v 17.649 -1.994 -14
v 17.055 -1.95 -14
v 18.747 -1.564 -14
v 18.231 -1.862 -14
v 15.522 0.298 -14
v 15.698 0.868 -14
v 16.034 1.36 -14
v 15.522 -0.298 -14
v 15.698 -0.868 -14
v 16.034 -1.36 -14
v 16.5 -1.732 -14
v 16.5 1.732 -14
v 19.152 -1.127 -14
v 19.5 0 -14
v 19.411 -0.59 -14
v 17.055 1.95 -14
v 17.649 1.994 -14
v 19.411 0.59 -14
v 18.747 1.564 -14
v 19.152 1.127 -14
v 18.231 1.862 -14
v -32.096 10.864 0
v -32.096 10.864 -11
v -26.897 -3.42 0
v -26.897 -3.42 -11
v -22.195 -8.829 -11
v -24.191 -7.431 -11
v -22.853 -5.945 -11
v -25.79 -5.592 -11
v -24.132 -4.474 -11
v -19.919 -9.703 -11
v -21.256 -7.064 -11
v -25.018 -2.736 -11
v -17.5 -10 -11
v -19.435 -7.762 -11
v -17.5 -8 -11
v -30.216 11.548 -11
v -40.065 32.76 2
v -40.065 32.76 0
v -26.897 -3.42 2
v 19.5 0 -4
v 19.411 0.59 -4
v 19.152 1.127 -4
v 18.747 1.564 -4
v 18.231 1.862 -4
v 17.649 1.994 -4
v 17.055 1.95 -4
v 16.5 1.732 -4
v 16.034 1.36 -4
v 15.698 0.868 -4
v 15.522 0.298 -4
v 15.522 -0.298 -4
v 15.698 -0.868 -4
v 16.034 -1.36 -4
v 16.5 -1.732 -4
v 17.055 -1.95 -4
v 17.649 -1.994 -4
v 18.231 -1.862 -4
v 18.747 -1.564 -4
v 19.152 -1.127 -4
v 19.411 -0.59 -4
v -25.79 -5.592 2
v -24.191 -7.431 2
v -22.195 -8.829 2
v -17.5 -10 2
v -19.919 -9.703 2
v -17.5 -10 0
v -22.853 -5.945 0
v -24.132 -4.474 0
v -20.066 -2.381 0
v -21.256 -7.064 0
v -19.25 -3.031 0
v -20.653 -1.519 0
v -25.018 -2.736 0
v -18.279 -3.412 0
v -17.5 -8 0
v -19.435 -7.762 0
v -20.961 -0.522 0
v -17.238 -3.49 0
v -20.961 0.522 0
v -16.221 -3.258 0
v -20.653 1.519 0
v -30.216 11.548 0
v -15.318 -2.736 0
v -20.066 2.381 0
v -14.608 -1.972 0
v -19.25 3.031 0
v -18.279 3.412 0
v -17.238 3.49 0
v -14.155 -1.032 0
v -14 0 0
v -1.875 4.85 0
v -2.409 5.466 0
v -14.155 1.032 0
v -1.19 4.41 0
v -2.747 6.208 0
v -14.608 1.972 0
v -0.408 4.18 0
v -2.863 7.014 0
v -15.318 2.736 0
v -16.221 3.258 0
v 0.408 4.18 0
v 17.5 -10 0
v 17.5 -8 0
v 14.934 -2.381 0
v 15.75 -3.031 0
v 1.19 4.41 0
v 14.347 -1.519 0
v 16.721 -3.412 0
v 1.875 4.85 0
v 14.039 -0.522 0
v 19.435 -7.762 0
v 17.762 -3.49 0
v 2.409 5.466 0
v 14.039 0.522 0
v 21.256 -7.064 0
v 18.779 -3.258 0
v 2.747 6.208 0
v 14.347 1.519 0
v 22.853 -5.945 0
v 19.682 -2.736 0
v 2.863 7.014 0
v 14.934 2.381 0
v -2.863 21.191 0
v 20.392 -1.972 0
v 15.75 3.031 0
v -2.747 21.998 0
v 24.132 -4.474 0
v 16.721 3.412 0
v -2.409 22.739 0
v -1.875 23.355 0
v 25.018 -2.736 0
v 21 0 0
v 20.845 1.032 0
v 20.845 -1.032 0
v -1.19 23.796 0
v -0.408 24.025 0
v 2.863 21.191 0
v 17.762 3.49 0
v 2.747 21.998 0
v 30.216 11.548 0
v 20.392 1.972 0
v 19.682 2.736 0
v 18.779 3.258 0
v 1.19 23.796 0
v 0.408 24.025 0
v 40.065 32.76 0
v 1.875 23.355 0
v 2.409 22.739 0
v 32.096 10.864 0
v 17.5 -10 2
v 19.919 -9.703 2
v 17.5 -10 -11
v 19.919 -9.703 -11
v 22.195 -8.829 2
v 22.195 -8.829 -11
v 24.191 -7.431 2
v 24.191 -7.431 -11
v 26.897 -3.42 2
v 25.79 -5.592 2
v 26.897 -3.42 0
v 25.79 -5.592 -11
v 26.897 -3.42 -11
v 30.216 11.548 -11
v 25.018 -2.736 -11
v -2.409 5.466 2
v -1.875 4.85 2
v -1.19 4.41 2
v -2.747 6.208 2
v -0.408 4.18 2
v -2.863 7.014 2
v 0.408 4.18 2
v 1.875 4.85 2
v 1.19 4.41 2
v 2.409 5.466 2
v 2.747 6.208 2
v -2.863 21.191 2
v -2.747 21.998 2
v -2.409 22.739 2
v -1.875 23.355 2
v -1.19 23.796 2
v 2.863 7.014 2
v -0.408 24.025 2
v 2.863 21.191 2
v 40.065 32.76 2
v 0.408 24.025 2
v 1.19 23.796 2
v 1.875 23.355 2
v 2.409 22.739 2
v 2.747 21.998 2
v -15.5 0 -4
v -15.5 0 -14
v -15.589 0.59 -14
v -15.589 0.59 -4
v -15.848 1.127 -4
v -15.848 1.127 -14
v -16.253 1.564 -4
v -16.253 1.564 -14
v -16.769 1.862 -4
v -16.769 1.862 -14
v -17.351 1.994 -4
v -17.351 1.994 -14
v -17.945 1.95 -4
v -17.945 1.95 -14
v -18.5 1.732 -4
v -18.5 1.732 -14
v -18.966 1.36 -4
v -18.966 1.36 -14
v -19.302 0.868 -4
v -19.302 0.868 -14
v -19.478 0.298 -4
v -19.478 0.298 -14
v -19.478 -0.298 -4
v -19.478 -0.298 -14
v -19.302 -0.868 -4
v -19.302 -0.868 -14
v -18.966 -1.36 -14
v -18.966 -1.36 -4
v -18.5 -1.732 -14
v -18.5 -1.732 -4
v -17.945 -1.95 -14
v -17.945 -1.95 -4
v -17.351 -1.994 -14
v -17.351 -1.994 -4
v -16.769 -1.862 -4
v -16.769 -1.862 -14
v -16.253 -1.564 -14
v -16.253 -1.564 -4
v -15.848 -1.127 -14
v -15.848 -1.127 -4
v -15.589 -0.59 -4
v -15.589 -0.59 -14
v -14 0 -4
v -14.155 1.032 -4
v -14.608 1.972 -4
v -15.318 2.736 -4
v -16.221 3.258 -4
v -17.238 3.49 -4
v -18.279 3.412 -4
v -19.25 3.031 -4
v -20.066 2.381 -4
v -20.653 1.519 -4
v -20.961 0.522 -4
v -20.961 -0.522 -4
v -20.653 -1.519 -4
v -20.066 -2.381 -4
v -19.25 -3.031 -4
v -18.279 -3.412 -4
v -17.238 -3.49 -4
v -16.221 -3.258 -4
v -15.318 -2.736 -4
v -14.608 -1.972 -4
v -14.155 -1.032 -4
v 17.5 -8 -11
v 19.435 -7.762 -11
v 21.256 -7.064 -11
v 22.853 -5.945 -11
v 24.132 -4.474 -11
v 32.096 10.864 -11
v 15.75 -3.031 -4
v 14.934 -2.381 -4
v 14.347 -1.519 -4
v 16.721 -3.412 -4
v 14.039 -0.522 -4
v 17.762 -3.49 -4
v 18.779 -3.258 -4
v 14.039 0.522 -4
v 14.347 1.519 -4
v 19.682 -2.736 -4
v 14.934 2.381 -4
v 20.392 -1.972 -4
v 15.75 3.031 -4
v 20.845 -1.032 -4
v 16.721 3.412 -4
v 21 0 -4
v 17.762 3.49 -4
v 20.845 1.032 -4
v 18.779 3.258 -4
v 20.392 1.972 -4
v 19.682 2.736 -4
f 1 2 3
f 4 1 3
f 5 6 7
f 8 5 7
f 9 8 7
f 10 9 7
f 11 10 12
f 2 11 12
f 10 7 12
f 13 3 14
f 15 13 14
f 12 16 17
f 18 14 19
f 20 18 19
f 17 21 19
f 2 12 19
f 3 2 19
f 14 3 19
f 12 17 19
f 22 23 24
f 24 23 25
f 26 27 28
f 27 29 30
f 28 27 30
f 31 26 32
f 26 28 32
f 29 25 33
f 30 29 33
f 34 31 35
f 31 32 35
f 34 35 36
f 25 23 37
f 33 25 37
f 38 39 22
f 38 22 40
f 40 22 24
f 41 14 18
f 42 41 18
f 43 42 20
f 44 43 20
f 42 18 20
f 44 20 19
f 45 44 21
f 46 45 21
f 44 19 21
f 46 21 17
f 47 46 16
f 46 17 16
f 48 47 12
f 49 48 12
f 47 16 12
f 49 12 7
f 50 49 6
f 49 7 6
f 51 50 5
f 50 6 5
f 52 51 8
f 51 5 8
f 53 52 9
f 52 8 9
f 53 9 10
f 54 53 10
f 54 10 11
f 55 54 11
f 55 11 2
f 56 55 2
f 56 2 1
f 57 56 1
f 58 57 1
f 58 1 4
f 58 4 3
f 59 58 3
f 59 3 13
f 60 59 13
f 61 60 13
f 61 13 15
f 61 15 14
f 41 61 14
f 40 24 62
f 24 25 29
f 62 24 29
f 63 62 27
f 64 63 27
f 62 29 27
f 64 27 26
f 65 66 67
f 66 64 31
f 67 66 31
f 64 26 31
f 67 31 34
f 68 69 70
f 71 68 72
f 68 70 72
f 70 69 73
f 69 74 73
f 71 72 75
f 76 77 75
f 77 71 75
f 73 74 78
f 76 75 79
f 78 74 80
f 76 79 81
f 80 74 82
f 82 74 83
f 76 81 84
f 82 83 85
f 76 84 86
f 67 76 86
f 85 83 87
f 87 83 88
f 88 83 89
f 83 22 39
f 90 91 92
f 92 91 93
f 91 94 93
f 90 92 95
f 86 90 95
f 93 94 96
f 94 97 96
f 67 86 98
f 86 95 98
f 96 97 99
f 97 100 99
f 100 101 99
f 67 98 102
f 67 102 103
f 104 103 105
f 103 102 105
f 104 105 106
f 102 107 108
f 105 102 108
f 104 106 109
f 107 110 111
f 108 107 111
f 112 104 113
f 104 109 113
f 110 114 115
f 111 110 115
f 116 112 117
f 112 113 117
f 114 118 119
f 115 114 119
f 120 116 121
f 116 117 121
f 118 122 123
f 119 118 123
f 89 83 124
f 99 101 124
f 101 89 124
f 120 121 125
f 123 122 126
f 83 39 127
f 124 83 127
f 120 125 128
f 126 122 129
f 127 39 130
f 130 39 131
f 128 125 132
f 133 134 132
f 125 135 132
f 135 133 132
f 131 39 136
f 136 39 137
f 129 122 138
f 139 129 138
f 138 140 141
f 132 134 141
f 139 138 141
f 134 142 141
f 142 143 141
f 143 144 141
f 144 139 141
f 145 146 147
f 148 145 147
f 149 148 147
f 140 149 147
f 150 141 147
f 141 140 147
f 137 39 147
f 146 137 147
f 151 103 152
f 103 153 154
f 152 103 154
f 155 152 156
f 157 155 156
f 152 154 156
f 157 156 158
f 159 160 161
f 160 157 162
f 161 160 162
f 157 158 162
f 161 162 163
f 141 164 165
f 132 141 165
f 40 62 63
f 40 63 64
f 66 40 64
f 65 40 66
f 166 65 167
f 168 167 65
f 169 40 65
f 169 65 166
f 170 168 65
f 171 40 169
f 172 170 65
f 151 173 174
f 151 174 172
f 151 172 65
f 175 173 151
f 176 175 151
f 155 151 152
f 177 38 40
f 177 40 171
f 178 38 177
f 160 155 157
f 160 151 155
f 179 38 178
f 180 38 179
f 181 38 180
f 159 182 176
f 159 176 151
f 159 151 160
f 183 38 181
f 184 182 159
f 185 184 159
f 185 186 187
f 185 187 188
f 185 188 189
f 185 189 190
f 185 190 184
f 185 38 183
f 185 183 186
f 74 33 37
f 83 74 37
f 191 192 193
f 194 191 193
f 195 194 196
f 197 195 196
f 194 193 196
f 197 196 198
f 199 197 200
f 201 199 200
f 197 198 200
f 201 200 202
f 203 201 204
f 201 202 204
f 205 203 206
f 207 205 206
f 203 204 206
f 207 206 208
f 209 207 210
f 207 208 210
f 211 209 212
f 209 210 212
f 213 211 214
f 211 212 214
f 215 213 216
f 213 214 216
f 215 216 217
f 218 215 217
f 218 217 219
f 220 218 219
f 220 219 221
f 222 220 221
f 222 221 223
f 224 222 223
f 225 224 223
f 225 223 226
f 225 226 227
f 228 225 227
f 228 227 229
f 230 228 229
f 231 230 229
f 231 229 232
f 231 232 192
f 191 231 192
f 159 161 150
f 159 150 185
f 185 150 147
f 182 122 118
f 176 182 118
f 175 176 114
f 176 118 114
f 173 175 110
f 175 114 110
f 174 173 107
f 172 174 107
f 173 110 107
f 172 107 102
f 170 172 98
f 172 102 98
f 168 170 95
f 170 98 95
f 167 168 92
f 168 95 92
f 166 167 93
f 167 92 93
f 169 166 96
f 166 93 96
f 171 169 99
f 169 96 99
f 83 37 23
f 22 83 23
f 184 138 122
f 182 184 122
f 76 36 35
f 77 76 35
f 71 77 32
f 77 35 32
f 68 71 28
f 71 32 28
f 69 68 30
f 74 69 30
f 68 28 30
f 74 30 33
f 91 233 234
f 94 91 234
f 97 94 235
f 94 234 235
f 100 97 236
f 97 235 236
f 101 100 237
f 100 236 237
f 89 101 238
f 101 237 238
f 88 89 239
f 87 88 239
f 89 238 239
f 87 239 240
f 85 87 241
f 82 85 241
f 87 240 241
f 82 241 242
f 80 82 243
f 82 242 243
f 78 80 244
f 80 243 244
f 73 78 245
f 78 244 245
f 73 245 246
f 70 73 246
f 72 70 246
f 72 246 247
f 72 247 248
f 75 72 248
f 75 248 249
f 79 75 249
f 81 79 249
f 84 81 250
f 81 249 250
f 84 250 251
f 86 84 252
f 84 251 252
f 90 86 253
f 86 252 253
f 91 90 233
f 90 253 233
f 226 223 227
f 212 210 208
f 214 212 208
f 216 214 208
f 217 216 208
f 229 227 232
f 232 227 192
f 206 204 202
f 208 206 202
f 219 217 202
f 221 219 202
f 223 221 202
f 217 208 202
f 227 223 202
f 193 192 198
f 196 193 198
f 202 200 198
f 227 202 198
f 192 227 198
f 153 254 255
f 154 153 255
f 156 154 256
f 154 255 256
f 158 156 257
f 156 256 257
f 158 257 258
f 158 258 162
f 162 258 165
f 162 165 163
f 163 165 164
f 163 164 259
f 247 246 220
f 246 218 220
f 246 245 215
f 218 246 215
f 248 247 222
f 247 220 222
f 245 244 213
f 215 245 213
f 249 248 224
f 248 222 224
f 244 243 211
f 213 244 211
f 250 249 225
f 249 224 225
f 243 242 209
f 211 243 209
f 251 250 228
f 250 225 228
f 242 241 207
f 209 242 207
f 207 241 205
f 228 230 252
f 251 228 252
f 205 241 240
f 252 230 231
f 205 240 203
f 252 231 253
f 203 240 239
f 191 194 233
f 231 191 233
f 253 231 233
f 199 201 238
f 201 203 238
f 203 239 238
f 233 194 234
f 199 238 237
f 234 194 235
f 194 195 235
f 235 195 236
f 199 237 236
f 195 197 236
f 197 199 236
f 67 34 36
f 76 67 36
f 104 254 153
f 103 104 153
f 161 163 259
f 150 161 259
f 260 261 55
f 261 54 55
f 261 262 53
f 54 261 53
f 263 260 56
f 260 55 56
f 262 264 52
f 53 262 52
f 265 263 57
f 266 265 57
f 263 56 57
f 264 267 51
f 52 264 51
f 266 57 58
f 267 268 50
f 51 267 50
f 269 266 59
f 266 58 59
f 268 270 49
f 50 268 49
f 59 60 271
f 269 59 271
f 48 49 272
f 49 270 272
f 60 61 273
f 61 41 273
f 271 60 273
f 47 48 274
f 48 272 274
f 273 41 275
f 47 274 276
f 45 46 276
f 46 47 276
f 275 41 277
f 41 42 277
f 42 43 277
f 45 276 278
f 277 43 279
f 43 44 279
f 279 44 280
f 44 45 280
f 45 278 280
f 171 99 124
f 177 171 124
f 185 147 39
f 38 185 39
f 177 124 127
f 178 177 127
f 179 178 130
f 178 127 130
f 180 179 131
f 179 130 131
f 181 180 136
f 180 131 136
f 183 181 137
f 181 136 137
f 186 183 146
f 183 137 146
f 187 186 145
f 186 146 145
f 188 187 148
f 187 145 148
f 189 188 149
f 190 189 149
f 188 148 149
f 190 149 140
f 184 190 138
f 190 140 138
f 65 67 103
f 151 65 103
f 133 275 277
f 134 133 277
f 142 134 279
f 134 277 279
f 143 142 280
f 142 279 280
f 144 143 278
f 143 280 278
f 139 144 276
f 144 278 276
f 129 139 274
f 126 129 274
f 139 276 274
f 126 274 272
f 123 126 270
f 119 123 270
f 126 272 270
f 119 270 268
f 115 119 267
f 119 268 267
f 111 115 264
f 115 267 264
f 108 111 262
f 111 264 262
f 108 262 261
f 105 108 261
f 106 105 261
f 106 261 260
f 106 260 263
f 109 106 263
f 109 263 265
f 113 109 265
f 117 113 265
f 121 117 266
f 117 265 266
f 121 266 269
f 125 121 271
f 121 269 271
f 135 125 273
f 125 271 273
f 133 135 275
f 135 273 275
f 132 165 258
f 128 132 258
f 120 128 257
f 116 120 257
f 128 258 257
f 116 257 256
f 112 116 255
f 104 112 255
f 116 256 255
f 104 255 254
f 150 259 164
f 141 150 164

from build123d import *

# Parameters (mm, degrees)
SKETCH1_R           = 2
BOSS_EXTRUDE1_DEPTH = 2
BOSS_EXTRUDE2_START = -6
SKETCH2_R           = 3.5
SKETCH2_R_2         = 2
BOSS_EXTRUDE2_DEPTH = 4
BOSS_EXTRUDE3_START = 11
BOSS_EXTRUDE3_DEPTH = 11
BOSS_EXTRUDE4_START = -16
SKETCH5_R           = 2
BOSS_EXTRUDE4_DEPTH = 16


with BuildPart() as part:
    # Sketch1 → Boss-Extrude1 (new body)
    with BuildSketch(Plane.XY):
        with BuildLine():
            Line((-17.5, -10), (17.5, -10))
            ThreePointArc((17.5, -10), (23.235764364, -8.191520443), (26.896926208, -3.420201433))
            Line((26.896926208, -3.420201433), (40.065448474, 32.76001614))
            Line((40.065448474, 32.76001614), (-40.065448474, 32.76001614))
            Line((-40.065448474, 32.76001614), (-26.896926208, -3.420201433))
            ThreePointArc((-26.896926208, -3.420201433), (-23.235764364, -8.191520443), (-17.5, -10))
        make_face()
        with Locations((17.5, 0)):
            Circle(SKETCH1_R, mode=Mode.SUBTRACT)
        with Locations((-17.5, 0)):
            Circle(SKETCH1_R, mode=Mode.SUBTRACT)
        with BuildLine():
            Line((2.863480555, 21.190949642), (2.863480555, 7.014373782))
            ThreePointArc((2.863480555, 7.014373782), (0, 4.150893227), (-2.863480555, 7.014373782))
            Line((-2.863480555, 7.014373782), (-2.863480555, 21.190949642))
            ThreePointArc((-2.863480555, 21.190949642), (0, 24.054430197), (2.863480555, 21.190949642))
        make_face(mode=Mode.SUBTRACT)
    extrude(amount=BOSS_EXTRUDE1_DEPTH)

    # Sketch2 → Boss-Extrude2 (add)
    # profile 1 of 2: a face of its own
    with BuildSketch(Plane.XY.offset(2).offset(BOSS_EXTRUDE2_START)):
        with Locations((-17.5, 0)):
            Circle(SKETCH2_R)
        with Locations((-17.5, 0)):
            Circle(SKETCH2_R_2, mode=Mode.SUBTRACT)
    # profile 2 of 2: a face of its own
    with BuildSketch(Plane.XY.offset(2).offset(BOSS_EXTRUDE2_START)):
        with Locations((17.5, 0)):
            Circle(SKETCH2_R)
        with Locations((17.5, 0)):
            Circle(SKETCH2_R_2, mode=Mode.SUBTRACT)
    extrude(amount=BOSS_EXTRUDE2_DEPTH)

    # Sketch4 → Boss-Extrude3 (add)
    with BuildSketch(Plane(origin=(0, 0, 0), x_dir=(-1, 0, 0), z_dir=(0, 0, -1)).offset(BOSS_EXTRUDE3_START)):
        with BuildLine():
            Line((-26.896926208, -3.420201433), (-32.095820312, 10.863642724))
            Line((-32.095820312, 10.863642724), (-30.21643507, 11.547683011))
            Line((-30.21643507, 11.547683011), (-25.017540966, -2.736161147))
            ThreePointArc((-25.017540966, -2.736161147), (-22.088611491, -6.553216354), (-17.5, -8))
            Line((-17.5, -8), (-17.5, -10))
            ThreePointArc((-17.5, -10), (-23.235764364, -8.191520443), (-26.896926208, -3.420201433))
        make_face()
        with BuildLine():
            Line((32.095820312, 10.863642724), (26.896926208, -3.420201433))
            ThreePointArc((26.896926208, -3.420201433), (23.235764364, -8.191520443), (17.5, -10))
            Line((17.5, -10), (17.5, -8))
            ThreePointArc((17.5, -8), (22.088611491, -6.553216354), (25.017540966, -2.736161147))
            Line((25.017540966, -2.736161147), (30.21643507, 11.547683011))
            Line((30.21643507, 11.547683011), (32.095820312, 10.863642724))
        make_face()
    extrude(amount=-BOSS_EXTRUDE3_DEPTH)

    # Sketch5 → Boss-Extrude4 (add)
    with BuildSketch(Plane.XY.offset(2).offset(BOSS_EXTRUDE4_START)):
        with Locations((-17.5, 0)):
            Circle(SKETCH5_R)
        with Locations((17.5, 0)):
            Circle(SKETCH5_R)
    extrude(amount=BOSS_EXTRUDE4_DEPTH)


solid = part.part
